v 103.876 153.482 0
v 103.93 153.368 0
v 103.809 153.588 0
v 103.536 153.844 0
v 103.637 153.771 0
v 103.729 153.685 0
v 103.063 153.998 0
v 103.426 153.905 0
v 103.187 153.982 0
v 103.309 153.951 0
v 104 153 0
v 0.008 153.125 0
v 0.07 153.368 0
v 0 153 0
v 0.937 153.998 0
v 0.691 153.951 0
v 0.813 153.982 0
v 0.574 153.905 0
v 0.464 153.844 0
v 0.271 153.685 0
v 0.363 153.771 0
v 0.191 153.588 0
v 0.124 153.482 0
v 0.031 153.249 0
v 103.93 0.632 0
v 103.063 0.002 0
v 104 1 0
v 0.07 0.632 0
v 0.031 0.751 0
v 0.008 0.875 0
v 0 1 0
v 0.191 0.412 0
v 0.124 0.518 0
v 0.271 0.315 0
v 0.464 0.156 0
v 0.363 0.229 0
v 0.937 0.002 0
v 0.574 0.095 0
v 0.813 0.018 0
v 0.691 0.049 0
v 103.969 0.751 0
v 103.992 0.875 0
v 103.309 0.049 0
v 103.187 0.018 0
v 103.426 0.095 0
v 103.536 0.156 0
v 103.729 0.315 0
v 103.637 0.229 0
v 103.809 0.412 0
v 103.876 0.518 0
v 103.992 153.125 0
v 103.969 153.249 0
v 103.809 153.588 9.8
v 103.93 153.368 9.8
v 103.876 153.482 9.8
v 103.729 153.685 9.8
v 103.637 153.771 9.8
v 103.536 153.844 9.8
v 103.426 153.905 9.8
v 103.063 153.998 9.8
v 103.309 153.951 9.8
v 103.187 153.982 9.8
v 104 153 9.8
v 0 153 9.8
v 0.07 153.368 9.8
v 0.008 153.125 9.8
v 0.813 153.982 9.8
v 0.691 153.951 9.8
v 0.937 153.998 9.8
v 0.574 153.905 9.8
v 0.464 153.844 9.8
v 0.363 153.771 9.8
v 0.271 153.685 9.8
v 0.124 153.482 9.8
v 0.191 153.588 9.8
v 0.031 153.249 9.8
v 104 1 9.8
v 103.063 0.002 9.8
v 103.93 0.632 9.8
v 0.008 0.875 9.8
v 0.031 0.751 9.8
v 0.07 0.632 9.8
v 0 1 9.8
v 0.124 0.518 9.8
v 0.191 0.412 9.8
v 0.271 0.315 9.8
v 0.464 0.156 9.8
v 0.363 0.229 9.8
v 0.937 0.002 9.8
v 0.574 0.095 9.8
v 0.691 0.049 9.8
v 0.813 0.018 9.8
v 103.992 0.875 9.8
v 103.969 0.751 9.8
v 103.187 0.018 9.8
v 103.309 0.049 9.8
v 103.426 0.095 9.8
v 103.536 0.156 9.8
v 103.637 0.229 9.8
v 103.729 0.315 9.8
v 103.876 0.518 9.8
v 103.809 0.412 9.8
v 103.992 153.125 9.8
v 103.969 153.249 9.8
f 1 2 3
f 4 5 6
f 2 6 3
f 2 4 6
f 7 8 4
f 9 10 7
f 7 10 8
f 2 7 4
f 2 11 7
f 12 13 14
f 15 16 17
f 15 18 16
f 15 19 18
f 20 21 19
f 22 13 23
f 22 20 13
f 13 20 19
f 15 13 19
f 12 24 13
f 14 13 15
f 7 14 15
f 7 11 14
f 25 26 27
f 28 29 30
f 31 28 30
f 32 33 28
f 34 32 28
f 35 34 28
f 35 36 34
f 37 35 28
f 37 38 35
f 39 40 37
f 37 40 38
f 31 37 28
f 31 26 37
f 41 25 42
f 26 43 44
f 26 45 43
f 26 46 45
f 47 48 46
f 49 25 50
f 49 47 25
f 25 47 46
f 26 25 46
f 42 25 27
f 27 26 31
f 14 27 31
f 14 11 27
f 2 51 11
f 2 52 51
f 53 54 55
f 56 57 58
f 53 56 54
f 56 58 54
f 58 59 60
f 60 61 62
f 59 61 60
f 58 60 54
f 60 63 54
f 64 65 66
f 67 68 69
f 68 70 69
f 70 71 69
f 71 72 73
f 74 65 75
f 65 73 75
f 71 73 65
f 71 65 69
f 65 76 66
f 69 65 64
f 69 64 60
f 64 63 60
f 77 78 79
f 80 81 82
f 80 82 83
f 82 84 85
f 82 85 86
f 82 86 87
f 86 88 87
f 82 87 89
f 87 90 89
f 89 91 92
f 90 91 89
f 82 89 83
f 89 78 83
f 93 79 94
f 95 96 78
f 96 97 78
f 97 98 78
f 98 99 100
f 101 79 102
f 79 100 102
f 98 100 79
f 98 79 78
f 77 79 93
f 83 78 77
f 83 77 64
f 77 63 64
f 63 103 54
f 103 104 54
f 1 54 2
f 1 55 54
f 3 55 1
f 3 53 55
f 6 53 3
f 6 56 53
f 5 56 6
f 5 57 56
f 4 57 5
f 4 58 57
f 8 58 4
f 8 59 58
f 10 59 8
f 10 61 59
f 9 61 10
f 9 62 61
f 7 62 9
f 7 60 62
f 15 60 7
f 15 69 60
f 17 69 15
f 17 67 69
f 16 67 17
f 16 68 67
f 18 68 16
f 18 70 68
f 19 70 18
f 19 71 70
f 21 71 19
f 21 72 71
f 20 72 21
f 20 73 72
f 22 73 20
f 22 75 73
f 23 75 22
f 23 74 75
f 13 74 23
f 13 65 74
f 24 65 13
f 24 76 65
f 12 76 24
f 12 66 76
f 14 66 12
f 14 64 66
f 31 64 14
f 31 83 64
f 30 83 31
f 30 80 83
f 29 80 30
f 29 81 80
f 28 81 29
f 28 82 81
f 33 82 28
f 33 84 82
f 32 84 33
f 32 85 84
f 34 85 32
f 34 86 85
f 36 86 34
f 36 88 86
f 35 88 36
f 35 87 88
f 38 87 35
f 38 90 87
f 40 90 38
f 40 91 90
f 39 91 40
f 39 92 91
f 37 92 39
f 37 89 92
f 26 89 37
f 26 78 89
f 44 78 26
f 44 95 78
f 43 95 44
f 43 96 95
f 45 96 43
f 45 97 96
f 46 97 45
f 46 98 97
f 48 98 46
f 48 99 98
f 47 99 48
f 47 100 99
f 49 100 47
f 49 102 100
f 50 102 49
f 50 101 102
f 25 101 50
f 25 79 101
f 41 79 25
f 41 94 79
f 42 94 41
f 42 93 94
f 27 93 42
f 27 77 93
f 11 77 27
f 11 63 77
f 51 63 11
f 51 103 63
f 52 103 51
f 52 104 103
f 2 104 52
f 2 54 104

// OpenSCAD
// file: ../../lib/primitive/rounded_square.scad
$bleed = 1;
$rounding = 3;

module rounded_square(size, flat_top=false, flat_bottom=false) {
  assert(!(flat_top && flat_bottom), "Flat top and flat bottom are exclusive");

  rounding_height = flat_top || flat_bottom 
    ? $rounding 
    : $rounding * 2;

  offset = flat_bottom ? 0 : $rounding;

  inner_size = [
    size[0] - $rounding * 2,
    size[1] - rounding_height,
  ];

  minkowski() {
    translate([$rounding, offset]) {
      square(inner_size);
    }
    if (flat_top ) {
      difference() {
        circle($rounding);
        translate([-$rounding, 0]) {
          square([$rounding * 2, $rounding]);
        }
      }
    } else if (flat_bottom) {
      difference() {
        circle($rounding);
        translate([-$rounding, -$rounding]) {
          square([$rounding * 2, $rounding]);
        }
      }
    } else {
      circle($rounding);
    }
  }
}
// file: ../../lib/primitive/rounded_cube.scad
include <./rounded_square.scad>

$bleed = 1;
$rounding = 3;

// Render a rounded cube
// flat_top: do not round the top edges
// flat_bottom: do not round the bottom edges
// flat: equals flat_top && flat_bottom
// 
// Limitations:
// requires height > $rounding * 2
// flat_top || flat_bottom requires height > $rounding
// flat_top && flat_bottom requires height > $bleed
module rounded_cube(
  size, 
  flat=false, 
  flat_top=false, 
  flat_bottom=false,
  side_rounding=-1
) {
  _flat = flat || (flat_top && flat_bottom);
  _flat_top = flat_top || flat;
  _flat_bottom = flat_bottom || flat;
  _rounding = min($rounding, size[2] / 2);
  _side_rounding = side_rounding > -1 ? side_rounding: $rounding;

  assert(_side_rounding >= $rounding, "side rounding cannot be less than rounding");

  top_height = _flat_top ? 0: _rounding;
  bottom_height = _flat_bottom ? 0: _rounding;

  cube_size = [
    size[0] - _rounding * 2,
    size[1] - _rounding * 2,
    size[2] - (top_height + bottom_height)
  ];

  if (_flat_top && _flat_bottom) {
     linear_extrude(cube_size[2]) {
       rounded_square([size[0], size[1]]);
     }
   } else {
     minkowski() {
       translate([_rounding, _rounding, bottom_height]) {
         if (_side_rounding != _rounding) {
           linear_extrude(cube_size[2]) {
             rounded_square([cube_size[0], cube_size[1]], $rounding=_side_rounding);
           }
         } else {
           cube(cube_size);
         }
       }

       if (_flat_top) {
         difference() {
           sphere(_rounding);
           cylinder(_rounding, _rounding, _rounding);
         }
       } else if (_flat_bottom) {
         difference() {
           sphere(_rounding);
           translate ([0, 0, -_rounding]) {
             cylinder(_rounding, _rounding, _rounding);
           }
         }
       } else {
         sphere(_rounding);
       }
    }
  }
}
// main file
include <../../lib/primitive/rounded_cube.scad>

$fn = 50;
$rounding = 1;

size = [
  104,
  154,
  9.8,
];

rounded_cube(size, flat=true);
